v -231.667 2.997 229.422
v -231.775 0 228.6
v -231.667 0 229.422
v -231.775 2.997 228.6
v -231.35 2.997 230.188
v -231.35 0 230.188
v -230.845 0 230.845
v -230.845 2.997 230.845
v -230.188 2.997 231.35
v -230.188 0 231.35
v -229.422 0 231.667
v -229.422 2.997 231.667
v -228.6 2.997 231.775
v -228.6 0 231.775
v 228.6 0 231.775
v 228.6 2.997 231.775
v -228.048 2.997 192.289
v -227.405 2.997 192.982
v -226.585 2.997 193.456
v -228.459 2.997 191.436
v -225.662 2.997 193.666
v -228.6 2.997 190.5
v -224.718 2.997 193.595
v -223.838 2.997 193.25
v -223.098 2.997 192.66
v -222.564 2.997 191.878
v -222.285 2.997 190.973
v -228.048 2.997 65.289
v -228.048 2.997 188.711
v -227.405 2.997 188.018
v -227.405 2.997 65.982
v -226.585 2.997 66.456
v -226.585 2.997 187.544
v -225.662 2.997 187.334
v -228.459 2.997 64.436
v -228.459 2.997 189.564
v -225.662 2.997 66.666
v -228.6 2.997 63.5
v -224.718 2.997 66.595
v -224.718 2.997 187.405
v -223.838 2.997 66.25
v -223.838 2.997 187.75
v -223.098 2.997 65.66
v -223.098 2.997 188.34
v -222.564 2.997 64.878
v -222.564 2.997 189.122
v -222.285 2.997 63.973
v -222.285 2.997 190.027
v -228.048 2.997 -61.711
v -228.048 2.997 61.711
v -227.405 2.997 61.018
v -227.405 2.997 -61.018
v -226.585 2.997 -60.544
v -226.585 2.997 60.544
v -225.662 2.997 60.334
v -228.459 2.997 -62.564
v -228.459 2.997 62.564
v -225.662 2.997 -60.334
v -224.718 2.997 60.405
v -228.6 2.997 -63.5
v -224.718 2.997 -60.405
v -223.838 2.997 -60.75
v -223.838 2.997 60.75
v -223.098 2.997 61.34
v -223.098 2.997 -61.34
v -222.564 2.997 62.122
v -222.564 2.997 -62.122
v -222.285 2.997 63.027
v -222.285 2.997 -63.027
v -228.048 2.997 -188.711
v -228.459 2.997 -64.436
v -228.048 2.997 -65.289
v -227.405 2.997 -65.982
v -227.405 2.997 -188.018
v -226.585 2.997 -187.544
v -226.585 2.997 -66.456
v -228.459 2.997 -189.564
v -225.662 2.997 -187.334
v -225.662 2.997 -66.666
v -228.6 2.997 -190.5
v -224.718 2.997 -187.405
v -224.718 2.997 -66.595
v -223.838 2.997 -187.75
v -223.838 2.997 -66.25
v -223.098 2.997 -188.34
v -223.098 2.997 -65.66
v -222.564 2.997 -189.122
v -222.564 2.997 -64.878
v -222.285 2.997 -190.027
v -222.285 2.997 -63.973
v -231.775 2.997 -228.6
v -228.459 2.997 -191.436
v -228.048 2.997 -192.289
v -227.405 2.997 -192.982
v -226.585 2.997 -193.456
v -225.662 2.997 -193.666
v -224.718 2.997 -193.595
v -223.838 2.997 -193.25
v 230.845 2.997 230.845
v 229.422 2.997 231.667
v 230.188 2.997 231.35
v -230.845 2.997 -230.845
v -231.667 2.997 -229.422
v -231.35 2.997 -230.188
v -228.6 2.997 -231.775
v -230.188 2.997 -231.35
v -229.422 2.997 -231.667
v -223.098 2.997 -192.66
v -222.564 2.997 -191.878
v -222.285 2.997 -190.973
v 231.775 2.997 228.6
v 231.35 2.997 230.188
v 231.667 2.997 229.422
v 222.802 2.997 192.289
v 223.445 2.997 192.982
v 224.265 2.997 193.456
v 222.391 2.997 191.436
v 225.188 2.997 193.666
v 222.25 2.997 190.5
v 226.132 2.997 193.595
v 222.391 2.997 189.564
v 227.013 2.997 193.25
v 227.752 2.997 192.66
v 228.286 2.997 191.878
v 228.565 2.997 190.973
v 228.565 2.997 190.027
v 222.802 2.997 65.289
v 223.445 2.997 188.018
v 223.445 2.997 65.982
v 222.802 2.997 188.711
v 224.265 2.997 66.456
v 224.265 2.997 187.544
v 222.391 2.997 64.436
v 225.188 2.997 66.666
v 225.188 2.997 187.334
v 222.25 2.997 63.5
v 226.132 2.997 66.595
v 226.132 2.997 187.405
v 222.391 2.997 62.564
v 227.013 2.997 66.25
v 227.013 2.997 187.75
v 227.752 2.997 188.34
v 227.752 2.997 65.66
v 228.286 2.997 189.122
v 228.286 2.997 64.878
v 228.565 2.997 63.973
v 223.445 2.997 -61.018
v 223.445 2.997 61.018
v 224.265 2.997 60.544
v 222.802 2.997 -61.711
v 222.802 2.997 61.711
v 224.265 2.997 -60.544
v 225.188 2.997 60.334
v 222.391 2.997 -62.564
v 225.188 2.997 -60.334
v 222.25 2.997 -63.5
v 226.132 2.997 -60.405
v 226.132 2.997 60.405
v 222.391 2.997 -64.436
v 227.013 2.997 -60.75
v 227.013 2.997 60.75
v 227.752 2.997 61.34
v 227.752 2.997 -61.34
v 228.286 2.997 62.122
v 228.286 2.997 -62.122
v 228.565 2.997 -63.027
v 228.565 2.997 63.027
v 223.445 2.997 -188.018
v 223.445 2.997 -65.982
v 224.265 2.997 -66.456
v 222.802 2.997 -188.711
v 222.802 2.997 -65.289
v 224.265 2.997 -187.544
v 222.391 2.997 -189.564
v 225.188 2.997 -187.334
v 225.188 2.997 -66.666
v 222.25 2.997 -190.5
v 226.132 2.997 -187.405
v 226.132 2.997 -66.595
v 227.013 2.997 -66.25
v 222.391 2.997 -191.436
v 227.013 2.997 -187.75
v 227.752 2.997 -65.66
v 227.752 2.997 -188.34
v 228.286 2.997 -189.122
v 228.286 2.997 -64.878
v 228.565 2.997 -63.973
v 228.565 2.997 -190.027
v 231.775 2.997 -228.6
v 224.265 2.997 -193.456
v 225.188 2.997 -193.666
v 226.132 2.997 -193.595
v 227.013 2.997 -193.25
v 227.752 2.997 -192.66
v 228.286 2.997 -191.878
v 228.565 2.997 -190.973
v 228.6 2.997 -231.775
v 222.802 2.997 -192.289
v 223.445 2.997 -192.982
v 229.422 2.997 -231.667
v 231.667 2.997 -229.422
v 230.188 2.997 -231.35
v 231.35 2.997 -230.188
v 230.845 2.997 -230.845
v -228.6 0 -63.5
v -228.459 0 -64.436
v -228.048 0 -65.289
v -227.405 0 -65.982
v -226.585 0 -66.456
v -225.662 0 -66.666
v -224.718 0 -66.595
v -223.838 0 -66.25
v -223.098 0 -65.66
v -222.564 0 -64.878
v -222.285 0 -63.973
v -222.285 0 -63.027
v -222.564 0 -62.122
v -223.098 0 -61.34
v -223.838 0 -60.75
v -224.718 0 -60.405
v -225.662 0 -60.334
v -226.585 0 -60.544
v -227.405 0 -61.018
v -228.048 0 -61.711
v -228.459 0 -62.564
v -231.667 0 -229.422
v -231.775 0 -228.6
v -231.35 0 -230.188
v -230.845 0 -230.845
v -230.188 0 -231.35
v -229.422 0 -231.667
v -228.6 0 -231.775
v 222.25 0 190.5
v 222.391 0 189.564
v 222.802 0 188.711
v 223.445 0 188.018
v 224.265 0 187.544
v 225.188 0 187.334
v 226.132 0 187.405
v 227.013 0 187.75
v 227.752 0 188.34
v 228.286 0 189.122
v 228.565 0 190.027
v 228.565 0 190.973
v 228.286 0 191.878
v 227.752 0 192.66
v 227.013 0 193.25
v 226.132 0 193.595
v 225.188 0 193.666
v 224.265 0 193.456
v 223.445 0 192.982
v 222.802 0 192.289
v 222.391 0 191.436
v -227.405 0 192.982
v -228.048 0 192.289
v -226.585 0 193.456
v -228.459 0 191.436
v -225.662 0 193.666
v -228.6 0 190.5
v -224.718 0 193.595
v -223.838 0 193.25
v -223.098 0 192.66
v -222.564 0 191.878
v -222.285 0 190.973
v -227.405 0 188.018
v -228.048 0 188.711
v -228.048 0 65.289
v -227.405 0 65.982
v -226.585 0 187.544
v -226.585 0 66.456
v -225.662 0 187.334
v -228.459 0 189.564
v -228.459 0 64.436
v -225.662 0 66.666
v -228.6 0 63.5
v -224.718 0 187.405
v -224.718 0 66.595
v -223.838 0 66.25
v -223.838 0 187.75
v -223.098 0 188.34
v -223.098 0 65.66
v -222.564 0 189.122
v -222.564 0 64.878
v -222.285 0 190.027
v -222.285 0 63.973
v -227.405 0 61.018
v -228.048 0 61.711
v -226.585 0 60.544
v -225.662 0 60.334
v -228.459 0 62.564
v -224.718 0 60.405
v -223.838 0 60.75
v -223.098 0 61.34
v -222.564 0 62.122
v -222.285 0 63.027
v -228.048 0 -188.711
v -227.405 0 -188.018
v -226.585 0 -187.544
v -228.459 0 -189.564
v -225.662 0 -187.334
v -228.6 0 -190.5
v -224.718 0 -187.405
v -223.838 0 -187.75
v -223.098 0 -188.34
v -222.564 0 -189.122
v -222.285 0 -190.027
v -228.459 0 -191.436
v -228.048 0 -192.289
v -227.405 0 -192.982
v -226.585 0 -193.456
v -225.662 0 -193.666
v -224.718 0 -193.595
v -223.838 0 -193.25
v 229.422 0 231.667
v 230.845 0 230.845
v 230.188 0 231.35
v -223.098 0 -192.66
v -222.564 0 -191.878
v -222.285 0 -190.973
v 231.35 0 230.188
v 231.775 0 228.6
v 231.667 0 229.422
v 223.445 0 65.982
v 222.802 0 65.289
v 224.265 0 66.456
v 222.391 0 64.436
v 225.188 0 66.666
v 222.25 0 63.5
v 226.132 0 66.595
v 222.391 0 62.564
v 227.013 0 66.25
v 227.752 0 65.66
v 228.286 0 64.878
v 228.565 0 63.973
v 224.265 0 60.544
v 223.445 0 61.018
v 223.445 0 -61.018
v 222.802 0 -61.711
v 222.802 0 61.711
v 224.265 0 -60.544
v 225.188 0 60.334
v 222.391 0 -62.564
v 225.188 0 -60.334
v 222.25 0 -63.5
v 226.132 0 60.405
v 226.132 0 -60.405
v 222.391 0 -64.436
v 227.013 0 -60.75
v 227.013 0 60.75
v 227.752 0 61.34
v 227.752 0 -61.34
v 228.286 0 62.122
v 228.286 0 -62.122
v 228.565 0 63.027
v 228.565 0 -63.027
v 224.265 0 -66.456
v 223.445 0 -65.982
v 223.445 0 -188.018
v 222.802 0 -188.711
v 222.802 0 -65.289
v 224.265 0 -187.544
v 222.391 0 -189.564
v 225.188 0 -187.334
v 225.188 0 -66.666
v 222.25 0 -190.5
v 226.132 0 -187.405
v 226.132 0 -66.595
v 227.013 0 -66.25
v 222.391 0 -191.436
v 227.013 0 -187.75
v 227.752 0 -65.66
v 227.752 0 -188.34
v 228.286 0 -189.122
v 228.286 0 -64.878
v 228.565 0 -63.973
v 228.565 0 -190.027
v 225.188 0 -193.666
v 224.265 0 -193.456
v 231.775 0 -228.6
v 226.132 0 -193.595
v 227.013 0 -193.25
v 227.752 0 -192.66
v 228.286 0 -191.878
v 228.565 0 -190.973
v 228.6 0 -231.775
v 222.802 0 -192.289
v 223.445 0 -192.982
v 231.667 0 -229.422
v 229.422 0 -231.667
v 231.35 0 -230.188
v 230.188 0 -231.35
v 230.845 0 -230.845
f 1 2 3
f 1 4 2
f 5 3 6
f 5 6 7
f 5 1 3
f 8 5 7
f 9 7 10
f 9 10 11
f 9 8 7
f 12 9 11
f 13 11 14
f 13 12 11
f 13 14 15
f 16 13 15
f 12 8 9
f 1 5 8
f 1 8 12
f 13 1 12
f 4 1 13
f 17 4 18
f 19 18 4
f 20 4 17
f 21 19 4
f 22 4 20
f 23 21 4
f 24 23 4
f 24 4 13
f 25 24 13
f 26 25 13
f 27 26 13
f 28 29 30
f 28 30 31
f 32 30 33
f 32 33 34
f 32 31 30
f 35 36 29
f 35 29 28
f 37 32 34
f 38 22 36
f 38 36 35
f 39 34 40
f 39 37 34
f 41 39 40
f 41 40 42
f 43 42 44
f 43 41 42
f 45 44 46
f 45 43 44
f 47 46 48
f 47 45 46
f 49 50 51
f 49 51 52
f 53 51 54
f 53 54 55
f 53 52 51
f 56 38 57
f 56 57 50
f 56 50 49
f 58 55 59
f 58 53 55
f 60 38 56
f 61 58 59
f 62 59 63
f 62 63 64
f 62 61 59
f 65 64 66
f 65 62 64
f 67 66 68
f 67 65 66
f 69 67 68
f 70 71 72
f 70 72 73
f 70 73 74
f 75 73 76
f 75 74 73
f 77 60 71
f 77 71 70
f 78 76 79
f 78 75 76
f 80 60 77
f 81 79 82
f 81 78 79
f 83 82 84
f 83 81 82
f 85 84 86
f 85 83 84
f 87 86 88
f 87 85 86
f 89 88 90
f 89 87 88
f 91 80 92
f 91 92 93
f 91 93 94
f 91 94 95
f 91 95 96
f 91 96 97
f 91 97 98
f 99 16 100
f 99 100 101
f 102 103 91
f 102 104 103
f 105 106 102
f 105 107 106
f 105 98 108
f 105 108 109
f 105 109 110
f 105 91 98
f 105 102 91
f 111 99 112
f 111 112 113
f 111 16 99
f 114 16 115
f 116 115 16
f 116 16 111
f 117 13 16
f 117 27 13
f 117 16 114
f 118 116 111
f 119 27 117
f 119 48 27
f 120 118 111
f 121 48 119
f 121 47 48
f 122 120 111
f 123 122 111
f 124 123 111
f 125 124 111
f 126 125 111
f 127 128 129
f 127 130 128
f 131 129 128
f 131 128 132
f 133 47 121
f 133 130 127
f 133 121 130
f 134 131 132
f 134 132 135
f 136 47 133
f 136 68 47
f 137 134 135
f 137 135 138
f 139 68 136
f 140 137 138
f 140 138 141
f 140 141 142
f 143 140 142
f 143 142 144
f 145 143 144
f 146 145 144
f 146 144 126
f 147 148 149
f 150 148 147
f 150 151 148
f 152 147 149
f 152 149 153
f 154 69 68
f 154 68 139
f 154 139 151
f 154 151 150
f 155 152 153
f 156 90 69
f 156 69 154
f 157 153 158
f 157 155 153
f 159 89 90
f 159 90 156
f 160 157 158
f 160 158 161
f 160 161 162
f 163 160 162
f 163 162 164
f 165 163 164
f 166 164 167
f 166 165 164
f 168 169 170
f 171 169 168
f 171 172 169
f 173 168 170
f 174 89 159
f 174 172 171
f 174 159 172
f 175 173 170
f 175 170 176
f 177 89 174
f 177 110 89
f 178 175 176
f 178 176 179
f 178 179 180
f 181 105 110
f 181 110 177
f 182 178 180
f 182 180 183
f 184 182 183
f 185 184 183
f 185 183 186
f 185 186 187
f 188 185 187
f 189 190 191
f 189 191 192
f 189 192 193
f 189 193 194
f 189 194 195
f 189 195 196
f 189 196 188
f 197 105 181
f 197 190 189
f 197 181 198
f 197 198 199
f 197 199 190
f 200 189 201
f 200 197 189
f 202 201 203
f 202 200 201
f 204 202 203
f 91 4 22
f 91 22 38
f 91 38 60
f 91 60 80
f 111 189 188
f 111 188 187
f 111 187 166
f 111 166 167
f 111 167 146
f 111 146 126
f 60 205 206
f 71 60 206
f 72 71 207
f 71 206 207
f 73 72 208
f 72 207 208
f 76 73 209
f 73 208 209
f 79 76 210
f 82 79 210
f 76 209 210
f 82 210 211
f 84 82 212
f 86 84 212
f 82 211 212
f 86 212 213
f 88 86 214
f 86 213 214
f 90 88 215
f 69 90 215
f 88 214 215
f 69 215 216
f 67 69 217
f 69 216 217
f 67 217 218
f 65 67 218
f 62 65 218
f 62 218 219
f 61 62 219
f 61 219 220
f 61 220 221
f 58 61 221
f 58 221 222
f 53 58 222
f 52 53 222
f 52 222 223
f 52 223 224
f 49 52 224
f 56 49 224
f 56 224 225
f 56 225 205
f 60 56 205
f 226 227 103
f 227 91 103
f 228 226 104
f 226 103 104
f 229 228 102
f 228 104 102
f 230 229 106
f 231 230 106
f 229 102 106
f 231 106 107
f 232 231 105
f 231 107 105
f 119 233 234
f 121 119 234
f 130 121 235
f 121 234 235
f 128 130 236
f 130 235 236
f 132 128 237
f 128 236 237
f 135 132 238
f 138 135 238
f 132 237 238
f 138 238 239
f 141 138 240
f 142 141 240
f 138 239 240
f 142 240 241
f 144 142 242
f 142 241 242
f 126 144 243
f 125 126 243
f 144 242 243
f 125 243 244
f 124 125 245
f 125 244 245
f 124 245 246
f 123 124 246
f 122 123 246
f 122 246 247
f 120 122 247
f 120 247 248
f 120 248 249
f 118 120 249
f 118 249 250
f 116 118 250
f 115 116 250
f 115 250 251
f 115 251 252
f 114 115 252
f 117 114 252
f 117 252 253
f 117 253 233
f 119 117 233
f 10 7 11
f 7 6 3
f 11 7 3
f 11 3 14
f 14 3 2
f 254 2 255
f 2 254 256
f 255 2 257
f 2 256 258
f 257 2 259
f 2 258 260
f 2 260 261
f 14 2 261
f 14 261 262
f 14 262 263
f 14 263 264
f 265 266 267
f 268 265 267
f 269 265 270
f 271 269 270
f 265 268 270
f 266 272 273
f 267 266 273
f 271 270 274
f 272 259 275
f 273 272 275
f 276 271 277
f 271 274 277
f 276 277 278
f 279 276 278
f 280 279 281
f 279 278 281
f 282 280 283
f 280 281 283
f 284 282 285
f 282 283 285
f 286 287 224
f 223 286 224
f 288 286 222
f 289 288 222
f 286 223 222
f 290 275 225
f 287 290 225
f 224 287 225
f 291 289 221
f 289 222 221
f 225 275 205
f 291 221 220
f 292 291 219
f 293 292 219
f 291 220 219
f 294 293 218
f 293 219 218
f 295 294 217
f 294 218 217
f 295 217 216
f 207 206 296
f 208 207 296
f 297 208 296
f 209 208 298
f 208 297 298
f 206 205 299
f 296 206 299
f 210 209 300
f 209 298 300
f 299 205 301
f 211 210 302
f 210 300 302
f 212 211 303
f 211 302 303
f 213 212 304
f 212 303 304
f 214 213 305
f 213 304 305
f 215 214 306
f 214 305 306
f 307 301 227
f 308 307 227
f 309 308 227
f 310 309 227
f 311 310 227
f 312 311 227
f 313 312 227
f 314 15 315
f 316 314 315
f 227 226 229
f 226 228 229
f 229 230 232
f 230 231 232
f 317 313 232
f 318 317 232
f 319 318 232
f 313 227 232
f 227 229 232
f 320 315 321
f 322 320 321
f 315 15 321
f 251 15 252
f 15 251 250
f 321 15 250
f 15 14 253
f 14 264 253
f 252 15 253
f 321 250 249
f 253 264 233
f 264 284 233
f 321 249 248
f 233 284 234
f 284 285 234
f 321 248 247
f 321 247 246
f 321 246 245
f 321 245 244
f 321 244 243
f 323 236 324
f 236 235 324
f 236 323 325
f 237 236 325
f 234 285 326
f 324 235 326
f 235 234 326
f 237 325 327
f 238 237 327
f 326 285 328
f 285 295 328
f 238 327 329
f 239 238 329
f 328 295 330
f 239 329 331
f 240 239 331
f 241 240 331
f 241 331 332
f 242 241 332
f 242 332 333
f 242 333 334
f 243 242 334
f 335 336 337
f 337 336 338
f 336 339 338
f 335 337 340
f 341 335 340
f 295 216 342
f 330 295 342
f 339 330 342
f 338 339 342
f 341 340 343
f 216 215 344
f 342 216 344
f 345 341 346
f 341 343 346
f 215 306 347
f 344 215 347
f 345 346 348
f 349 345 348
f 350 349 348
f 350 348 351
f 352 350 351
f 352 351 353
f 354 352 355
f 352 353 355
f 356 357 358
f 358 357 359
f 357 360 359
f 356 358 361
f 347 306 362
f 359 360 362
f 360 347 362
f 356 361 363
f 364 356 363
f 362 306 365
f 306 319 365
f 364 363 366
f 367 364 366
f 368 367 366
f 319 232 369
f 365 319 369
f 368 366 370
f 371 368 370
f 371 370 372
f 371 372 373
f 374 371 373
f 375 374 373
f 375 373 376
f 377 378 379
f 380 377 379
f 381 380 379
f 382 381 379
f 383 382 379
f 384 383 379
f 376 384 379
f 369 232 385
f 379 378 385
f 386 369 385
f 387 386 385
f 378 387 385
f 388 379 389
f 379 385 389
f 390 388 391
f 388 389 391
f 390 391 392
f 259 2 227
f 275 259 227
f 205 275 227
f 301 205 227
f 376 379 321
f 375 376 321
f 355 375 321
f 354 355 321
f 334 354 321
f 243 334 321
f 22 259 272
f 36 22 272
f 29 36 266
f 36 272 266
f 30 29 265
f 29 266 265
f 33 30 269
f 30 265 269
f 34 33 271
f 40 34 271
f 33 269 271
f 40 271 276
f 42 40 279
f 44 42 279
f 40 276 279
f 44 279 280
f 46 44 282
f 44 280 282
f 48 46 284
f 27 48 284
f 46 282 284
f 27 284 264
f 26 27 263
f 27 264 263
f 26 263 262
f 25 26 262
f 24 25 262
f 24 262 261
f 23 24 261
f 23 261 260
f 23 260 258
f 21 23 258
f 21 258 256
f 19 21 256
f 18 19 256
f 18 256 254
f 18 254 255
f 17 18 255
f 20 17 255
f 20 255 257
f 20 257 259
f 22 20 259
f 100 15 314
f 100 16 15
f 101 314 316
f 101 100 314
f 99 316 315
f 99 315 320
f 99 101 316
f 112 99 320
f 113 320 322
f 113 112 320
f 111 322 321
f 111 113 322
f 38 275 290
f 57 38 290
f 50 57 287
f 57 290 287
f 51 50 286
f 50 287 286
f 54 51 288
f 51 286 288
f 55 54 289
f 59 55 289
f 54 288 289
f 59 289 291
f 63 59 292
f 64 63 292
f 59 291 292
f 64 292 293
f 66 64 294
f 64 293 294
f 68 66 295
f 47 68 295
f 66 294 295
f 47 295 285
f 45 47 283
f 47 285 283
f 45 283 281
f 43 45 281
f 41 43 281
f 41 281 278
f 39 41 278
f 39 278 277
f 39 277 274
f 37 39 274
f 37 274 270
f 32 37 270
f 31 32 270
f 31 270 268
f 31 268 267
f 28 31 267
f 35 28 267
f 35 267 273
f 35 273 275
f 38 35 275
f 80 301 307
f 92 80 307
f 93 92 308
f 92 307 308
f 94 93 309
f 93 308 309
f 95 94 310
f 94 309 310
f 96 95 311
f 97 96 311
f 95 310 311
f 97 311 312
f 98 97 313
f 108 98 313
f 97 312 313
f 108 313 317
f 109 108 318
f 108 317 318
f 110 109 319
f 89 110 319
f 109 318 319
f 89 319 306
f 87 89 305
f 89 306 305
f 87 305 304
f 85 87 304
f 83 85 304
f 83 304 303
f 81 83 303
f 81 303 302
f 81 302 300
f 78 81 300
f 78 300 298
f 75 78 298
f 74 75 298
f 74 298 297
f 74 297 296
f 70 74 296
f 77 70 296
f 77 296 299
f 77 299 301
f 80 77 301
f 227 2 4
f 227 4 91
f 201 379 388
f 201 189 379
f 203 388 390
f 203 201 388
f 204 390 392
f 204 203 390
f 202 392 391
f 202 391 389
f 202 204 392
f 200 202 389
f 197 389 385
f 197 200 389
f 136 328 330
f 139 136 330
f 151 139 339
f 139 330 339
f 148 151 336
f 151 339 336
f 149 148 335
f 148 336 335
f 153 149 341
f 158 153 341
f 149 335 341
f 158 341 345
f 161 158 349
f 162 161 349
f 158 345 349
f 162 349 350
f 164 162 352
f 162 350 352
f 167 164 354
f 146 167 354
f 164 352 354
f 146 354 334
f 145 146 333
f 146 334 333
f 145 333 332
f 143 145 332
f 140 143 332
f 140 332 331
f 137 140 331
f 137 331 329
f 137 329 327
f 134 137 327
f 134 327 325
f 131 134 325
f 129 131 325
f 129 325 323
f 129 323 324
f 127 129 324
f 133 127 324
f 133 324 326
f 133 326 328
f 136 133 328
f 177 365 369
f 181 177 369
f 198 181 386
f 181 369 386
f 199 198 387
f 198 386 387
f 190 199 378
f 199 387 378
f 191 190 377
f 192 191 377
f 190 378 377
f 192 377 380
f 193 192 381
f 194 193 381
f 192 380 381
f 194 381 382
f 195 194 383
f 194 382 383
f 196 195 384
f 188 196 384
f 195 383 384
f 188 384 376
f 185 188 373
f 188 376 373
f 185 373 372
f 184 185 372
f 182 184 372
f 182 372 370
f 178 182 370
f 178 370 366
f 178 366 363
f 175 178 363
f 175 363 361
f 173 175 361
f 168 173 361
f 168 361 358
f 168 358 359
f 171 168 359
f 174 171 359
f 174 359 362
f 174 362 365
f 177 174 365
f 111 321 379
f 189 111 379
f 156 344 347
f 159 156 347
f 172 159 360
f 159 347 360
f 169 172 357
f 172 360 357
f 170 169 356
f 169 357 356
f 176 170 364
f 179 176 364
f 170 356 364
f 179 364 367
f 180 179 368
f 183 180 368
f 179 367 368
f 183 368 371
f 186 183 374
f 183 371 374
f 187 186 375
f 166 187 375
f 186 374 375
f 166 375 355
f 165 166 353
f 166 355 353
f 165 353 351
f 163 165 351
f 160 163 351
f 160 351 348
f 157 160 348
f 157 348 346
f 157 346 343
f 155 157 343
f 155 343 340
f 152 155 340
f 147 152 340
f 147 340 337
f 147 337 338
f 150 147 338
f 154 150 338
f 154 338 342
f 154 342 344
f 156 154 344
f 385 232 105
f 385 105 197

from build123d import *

# Parameters (mm, degrees)
SKETCH1_W                   = 463.55
SKETCH1_H                   = 463.55
BOSS_EXTRUDE1_DEPTH         = 2.9972
FILLET1_R                   = 3.175
F_1_4_0_25_DIAMETER_HOLE1_D = 6.35


with BuildPart() as part:
    # Sketch1 → Boss-Extrude1 (new body)
    with BuildSketch(Plane(origin=(0, 0, 0), x_dir=(1, 0, 0), z_dir=(0, 1, 0))):
        Rectangle(SKETCH1_W, SKETCH1_H)
    extrude(amount=BOSS_EXTRUDE1_DEPTH)

    # Fillet1
    fillet1_edges = [part.edges().sort_by_distance(p)[0] for p in [
        (231.775, 1.4986, 231.775),
        (-231.775, 1.4986, 231.775),
        (-231.775, 1.4986, -231.775),
        (231.775, 1.4986, -231.775),
    ]]
    fillet(fillet1_edges, radius=FILLET1_R)

    # 1/4 (0.25) Diameter Hole1 (through all)
    with Locations(Plane(origin=(0, 2.9972, 0), x_dir=(1, 0, 0), z_dir=(0, 1, 0))):
        with Locations((-225.425, 190.5), (225.425, 190.5), (225.425, 63.5), (225.425, -63.5), (225.425, -190.5), (-225.425, 63.5), (-225.425, -63.5), (-225.425, -190.5)):
            Hole(F_1_4_0_25_DIAMETER_HOLE1_D / 2)


solid = part.part
